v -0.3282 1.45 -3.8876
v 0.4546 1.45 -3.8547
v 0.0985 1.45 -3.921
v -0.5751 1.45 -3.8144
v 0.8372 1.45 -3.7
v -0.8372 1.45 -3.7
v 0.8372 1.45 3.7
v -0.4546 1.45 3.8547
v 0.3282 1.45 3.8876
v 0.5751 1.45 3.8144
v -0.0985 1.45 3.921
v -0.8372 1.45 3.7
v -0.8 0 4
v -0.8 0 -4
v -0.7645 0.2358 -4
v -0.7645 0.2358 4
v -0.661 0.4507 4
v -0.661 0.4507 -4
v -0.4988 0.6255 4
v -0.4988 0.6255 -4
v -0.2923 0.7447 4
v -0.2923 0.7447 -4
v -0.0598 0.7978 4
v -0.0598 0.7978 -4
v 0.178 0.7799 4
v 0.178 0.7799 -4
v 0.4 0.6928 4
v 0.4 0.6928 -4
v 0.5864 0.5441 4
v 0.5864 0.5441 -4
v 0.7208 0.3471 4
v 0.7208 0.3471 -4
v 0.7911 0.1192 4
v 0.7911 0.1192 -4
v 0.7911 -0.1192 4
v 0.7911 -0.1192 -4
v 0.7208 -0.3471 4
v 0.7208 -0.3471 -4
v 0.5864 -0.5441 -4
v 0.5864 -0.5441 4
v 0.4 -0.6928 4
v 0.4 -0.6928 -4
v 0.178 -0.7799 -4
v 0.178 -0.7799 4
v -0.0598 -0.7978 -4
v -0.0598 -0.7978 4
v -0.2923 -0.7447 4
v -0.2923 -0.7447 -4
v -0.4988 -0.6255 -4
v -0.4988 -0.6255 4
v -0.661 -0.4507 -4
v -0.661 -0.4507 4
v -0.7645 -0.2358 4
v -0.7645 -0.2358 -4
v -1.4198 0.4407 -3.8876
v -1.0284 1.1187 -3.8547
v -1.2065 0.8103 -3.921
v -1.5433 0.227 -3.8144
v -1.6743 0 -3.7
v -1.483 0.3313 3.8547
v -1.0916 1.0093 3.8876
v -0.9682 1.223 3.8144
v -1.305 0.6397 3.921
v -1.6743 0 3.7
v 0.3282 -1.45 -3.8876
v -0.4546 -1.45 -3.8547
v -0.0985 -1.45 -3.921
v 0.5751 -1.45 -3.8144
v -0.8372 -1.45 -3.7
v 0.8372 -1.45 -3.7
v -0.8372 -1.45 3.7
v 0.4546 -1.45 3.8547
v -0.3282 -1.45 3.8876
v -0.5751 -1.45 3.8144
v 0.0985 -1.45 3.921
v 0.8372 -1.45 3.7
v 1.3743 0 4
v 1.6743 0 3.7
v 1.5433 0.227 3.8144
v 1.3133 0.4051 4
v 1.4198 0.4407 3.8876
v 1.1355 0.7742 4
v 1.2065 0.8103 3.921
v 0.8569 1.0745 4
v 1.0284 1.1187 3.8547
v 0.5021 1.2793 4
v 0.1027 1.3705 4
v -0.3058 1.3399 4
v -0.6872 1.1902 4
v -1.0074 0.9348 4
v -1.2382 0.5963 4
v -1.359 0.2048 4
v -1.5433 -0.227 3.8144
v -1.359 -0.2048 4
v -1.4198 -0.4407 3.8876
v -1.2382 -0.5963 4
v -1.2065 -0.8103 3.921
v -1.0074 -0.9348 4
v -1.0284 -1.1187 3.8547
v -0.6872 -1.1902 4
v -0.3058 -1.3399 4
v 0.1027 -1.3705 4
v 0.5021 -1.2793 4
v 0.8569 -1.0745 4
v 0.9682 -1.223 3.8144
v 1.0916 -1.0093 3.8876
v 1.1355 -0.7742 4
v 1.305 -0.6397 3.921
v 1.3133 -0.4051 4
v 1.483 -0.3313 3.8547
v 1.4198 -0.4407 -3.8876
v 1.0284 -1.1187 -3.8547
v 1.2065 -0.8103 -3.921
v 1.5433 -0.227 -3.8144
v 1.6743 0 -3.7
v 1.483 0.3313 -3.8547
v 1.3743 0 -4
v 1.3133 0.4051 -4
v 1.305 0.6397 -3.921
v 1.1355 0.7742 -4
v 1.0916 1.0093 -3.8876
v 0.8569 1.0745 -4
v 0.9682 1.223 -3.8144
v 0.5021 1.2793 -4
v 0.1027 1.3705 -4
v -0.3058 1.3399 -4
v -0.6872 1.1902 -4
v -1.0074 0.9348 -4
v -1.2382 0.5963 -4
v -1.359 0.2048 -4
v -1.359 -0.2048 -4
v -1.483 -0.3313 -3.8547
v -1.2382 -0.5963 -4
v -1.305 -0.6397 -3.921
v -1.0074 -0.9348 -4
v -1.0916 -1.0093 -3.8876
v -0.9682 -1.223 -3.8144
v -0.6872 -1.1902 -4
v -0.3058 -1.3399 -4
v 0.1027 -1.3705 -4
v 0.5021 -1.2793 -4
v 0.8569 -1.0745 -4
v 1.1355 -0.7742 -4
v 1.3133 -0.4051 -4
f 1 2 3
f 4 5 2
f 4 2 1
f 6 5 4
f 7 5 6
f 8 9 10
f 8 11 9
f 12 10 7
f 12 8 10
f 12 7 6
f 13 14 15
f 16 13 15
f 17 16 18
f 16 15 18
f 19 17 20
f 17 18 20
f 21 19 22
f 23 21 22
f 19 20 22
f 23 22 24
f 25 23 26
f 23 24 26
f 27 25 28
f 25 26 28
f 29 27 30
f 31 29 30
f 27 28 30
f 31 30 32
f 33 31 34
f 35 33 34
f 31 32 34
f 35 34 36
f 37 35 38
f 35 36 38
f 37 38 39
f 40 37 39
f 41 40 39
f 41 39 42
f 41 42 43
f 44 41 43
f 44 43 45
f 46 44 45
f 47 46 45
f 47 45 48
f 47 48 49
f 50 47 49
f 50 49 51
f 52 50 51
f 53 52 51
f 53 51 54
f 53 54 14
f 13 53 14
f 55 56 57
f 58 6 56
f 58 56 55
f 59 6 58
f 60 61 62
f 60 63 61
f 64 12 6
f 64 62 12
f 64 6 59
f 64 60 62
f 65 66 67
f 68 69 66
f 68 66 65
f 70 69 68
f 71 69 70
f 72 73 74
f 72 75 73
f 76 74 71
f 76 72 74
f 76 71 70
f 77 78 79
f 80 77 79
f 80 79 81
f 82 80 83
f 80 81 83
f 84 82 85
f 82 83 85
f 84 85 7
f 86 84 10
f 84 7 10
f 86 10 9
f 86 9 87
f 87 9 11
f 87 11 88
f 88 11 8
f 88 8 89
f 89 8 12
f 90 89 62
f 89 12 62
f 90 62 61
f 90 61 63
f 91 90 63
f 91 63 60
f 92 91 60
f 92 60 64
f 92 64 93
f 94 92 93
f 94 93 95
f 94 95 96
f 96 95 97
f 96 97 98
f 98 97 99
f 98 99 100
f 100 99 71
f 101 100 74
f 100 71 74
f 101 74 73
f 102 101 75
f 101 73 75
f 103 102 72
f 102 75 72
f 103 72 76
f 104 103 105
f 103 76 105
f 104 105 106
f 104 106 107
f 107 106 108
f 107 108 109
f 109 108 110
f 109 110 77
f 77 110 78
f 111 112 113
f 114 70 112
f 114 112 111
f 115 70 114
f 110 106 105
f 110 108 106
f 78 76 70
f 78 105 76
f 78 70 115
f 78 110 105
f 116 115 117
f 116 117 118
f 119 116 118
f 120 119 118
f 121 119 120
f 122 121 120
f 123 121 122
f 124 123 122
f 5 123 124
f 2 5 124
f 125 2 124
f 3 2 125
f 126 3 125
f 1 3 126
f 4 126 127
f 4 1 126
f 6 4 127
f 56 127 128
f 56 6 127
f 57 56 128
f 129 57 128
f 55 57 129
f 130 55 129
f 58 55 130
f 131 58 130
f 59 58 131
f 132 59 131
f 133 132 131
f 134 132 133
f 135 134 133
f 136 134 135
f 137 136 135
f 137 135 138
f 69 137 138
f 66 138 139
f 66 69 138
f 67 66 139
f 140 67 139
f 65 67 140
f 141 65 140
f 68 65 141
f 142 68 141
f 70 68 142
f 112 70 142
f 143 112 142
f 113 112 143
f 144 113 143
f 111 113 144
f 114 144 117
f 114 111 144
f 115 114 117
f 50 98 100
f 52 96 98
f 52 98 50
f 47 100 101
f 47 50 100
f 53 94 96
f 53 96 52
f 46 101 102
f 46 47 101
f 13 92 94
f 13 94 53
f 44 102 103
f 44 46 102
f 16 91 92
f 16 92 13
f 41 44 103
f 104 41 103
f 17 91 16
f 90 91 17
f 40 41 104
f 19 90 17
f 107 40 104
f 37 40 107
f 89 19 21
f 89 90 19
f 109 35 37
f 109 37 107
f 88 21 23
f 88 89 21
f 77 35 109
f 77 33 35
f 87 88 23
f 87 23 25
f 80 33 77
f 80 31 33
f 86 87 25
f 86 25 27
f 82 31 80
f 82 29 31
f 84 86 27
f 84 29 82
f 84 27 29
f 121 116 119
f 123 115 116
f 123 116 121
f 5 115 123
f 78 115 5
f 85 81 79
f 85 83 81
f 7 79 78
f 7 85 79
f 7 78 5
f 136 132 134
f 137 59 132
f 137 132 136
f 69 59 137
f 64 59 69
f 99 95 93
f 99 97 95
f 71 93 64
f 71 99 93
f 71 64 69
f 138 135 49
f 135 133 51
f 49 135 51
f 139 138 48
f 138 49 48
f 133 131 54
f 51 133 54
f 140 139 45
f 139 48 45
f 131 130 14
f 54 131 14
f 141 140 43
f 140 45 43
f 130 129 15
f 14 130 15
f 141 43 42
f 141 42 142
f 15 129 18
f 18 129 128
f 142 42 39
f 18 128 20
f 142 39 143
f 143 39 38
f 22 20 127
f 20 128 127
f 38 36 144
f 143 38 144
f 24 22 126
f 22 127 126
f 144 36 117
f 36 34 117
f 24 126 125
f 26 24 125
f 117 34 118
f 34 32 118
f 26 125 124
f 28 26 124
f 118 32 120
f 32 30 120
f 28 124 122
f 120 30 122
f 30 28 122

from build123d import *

# Parameters (mm, degrees)
EXTRUDE_1_DEPTH   = 4
HOLE_WIZARD_M21_D = 1.6


with BuildPart() as part:
    # Эскиз1 → Бобышка-Вытянуть1 (new, symmetric)
    with BuildSketch(Plane.XY):
        Polygon((1.674315781, 0), (0.83715789, 1.45), (-0.83715789, 1.45), (-1.674315781, 0), (-0.83715789, -1.45), (0.83715789, -1.45), align=None)
    extrude(amount=EXTRUDE_1_DEPTH, both=True)

    # Отверстие обработанное метчиком M21 (through all)
    with Locations(Plane.XY.offset(4)):
        with Locations((0, 0)):
            Hole(HOLE_WIZARD_M21_D / 2)

    # Эскиз4 → Вырез-Повернуть1 (revolve, cut)
    with BuildSketch(Plane(origin=(0, 0, 0), x_dir=(0, 0, -1), z_dir=(0, 1, 0)), mode=Mode.PRIVATE) as cut_revolve_1_sk:
        Polygon((4, 1.374315781), (3.7, 1.674315781), (4, 1.674315781), align=None)
        Polygon((-4, 1.674315781), (-4, 1.374315781), (-3.7, 1.674315781), align=None)
    revolve(cut_revolve_1_sk.sketch.rotate(Axis((0, 0, -4), (0, 0, 1)), 180), axis=Axis((0, 0, -4), (0, 0, 1)), mode=Mode.SUBTRACT)


solid = part.part
